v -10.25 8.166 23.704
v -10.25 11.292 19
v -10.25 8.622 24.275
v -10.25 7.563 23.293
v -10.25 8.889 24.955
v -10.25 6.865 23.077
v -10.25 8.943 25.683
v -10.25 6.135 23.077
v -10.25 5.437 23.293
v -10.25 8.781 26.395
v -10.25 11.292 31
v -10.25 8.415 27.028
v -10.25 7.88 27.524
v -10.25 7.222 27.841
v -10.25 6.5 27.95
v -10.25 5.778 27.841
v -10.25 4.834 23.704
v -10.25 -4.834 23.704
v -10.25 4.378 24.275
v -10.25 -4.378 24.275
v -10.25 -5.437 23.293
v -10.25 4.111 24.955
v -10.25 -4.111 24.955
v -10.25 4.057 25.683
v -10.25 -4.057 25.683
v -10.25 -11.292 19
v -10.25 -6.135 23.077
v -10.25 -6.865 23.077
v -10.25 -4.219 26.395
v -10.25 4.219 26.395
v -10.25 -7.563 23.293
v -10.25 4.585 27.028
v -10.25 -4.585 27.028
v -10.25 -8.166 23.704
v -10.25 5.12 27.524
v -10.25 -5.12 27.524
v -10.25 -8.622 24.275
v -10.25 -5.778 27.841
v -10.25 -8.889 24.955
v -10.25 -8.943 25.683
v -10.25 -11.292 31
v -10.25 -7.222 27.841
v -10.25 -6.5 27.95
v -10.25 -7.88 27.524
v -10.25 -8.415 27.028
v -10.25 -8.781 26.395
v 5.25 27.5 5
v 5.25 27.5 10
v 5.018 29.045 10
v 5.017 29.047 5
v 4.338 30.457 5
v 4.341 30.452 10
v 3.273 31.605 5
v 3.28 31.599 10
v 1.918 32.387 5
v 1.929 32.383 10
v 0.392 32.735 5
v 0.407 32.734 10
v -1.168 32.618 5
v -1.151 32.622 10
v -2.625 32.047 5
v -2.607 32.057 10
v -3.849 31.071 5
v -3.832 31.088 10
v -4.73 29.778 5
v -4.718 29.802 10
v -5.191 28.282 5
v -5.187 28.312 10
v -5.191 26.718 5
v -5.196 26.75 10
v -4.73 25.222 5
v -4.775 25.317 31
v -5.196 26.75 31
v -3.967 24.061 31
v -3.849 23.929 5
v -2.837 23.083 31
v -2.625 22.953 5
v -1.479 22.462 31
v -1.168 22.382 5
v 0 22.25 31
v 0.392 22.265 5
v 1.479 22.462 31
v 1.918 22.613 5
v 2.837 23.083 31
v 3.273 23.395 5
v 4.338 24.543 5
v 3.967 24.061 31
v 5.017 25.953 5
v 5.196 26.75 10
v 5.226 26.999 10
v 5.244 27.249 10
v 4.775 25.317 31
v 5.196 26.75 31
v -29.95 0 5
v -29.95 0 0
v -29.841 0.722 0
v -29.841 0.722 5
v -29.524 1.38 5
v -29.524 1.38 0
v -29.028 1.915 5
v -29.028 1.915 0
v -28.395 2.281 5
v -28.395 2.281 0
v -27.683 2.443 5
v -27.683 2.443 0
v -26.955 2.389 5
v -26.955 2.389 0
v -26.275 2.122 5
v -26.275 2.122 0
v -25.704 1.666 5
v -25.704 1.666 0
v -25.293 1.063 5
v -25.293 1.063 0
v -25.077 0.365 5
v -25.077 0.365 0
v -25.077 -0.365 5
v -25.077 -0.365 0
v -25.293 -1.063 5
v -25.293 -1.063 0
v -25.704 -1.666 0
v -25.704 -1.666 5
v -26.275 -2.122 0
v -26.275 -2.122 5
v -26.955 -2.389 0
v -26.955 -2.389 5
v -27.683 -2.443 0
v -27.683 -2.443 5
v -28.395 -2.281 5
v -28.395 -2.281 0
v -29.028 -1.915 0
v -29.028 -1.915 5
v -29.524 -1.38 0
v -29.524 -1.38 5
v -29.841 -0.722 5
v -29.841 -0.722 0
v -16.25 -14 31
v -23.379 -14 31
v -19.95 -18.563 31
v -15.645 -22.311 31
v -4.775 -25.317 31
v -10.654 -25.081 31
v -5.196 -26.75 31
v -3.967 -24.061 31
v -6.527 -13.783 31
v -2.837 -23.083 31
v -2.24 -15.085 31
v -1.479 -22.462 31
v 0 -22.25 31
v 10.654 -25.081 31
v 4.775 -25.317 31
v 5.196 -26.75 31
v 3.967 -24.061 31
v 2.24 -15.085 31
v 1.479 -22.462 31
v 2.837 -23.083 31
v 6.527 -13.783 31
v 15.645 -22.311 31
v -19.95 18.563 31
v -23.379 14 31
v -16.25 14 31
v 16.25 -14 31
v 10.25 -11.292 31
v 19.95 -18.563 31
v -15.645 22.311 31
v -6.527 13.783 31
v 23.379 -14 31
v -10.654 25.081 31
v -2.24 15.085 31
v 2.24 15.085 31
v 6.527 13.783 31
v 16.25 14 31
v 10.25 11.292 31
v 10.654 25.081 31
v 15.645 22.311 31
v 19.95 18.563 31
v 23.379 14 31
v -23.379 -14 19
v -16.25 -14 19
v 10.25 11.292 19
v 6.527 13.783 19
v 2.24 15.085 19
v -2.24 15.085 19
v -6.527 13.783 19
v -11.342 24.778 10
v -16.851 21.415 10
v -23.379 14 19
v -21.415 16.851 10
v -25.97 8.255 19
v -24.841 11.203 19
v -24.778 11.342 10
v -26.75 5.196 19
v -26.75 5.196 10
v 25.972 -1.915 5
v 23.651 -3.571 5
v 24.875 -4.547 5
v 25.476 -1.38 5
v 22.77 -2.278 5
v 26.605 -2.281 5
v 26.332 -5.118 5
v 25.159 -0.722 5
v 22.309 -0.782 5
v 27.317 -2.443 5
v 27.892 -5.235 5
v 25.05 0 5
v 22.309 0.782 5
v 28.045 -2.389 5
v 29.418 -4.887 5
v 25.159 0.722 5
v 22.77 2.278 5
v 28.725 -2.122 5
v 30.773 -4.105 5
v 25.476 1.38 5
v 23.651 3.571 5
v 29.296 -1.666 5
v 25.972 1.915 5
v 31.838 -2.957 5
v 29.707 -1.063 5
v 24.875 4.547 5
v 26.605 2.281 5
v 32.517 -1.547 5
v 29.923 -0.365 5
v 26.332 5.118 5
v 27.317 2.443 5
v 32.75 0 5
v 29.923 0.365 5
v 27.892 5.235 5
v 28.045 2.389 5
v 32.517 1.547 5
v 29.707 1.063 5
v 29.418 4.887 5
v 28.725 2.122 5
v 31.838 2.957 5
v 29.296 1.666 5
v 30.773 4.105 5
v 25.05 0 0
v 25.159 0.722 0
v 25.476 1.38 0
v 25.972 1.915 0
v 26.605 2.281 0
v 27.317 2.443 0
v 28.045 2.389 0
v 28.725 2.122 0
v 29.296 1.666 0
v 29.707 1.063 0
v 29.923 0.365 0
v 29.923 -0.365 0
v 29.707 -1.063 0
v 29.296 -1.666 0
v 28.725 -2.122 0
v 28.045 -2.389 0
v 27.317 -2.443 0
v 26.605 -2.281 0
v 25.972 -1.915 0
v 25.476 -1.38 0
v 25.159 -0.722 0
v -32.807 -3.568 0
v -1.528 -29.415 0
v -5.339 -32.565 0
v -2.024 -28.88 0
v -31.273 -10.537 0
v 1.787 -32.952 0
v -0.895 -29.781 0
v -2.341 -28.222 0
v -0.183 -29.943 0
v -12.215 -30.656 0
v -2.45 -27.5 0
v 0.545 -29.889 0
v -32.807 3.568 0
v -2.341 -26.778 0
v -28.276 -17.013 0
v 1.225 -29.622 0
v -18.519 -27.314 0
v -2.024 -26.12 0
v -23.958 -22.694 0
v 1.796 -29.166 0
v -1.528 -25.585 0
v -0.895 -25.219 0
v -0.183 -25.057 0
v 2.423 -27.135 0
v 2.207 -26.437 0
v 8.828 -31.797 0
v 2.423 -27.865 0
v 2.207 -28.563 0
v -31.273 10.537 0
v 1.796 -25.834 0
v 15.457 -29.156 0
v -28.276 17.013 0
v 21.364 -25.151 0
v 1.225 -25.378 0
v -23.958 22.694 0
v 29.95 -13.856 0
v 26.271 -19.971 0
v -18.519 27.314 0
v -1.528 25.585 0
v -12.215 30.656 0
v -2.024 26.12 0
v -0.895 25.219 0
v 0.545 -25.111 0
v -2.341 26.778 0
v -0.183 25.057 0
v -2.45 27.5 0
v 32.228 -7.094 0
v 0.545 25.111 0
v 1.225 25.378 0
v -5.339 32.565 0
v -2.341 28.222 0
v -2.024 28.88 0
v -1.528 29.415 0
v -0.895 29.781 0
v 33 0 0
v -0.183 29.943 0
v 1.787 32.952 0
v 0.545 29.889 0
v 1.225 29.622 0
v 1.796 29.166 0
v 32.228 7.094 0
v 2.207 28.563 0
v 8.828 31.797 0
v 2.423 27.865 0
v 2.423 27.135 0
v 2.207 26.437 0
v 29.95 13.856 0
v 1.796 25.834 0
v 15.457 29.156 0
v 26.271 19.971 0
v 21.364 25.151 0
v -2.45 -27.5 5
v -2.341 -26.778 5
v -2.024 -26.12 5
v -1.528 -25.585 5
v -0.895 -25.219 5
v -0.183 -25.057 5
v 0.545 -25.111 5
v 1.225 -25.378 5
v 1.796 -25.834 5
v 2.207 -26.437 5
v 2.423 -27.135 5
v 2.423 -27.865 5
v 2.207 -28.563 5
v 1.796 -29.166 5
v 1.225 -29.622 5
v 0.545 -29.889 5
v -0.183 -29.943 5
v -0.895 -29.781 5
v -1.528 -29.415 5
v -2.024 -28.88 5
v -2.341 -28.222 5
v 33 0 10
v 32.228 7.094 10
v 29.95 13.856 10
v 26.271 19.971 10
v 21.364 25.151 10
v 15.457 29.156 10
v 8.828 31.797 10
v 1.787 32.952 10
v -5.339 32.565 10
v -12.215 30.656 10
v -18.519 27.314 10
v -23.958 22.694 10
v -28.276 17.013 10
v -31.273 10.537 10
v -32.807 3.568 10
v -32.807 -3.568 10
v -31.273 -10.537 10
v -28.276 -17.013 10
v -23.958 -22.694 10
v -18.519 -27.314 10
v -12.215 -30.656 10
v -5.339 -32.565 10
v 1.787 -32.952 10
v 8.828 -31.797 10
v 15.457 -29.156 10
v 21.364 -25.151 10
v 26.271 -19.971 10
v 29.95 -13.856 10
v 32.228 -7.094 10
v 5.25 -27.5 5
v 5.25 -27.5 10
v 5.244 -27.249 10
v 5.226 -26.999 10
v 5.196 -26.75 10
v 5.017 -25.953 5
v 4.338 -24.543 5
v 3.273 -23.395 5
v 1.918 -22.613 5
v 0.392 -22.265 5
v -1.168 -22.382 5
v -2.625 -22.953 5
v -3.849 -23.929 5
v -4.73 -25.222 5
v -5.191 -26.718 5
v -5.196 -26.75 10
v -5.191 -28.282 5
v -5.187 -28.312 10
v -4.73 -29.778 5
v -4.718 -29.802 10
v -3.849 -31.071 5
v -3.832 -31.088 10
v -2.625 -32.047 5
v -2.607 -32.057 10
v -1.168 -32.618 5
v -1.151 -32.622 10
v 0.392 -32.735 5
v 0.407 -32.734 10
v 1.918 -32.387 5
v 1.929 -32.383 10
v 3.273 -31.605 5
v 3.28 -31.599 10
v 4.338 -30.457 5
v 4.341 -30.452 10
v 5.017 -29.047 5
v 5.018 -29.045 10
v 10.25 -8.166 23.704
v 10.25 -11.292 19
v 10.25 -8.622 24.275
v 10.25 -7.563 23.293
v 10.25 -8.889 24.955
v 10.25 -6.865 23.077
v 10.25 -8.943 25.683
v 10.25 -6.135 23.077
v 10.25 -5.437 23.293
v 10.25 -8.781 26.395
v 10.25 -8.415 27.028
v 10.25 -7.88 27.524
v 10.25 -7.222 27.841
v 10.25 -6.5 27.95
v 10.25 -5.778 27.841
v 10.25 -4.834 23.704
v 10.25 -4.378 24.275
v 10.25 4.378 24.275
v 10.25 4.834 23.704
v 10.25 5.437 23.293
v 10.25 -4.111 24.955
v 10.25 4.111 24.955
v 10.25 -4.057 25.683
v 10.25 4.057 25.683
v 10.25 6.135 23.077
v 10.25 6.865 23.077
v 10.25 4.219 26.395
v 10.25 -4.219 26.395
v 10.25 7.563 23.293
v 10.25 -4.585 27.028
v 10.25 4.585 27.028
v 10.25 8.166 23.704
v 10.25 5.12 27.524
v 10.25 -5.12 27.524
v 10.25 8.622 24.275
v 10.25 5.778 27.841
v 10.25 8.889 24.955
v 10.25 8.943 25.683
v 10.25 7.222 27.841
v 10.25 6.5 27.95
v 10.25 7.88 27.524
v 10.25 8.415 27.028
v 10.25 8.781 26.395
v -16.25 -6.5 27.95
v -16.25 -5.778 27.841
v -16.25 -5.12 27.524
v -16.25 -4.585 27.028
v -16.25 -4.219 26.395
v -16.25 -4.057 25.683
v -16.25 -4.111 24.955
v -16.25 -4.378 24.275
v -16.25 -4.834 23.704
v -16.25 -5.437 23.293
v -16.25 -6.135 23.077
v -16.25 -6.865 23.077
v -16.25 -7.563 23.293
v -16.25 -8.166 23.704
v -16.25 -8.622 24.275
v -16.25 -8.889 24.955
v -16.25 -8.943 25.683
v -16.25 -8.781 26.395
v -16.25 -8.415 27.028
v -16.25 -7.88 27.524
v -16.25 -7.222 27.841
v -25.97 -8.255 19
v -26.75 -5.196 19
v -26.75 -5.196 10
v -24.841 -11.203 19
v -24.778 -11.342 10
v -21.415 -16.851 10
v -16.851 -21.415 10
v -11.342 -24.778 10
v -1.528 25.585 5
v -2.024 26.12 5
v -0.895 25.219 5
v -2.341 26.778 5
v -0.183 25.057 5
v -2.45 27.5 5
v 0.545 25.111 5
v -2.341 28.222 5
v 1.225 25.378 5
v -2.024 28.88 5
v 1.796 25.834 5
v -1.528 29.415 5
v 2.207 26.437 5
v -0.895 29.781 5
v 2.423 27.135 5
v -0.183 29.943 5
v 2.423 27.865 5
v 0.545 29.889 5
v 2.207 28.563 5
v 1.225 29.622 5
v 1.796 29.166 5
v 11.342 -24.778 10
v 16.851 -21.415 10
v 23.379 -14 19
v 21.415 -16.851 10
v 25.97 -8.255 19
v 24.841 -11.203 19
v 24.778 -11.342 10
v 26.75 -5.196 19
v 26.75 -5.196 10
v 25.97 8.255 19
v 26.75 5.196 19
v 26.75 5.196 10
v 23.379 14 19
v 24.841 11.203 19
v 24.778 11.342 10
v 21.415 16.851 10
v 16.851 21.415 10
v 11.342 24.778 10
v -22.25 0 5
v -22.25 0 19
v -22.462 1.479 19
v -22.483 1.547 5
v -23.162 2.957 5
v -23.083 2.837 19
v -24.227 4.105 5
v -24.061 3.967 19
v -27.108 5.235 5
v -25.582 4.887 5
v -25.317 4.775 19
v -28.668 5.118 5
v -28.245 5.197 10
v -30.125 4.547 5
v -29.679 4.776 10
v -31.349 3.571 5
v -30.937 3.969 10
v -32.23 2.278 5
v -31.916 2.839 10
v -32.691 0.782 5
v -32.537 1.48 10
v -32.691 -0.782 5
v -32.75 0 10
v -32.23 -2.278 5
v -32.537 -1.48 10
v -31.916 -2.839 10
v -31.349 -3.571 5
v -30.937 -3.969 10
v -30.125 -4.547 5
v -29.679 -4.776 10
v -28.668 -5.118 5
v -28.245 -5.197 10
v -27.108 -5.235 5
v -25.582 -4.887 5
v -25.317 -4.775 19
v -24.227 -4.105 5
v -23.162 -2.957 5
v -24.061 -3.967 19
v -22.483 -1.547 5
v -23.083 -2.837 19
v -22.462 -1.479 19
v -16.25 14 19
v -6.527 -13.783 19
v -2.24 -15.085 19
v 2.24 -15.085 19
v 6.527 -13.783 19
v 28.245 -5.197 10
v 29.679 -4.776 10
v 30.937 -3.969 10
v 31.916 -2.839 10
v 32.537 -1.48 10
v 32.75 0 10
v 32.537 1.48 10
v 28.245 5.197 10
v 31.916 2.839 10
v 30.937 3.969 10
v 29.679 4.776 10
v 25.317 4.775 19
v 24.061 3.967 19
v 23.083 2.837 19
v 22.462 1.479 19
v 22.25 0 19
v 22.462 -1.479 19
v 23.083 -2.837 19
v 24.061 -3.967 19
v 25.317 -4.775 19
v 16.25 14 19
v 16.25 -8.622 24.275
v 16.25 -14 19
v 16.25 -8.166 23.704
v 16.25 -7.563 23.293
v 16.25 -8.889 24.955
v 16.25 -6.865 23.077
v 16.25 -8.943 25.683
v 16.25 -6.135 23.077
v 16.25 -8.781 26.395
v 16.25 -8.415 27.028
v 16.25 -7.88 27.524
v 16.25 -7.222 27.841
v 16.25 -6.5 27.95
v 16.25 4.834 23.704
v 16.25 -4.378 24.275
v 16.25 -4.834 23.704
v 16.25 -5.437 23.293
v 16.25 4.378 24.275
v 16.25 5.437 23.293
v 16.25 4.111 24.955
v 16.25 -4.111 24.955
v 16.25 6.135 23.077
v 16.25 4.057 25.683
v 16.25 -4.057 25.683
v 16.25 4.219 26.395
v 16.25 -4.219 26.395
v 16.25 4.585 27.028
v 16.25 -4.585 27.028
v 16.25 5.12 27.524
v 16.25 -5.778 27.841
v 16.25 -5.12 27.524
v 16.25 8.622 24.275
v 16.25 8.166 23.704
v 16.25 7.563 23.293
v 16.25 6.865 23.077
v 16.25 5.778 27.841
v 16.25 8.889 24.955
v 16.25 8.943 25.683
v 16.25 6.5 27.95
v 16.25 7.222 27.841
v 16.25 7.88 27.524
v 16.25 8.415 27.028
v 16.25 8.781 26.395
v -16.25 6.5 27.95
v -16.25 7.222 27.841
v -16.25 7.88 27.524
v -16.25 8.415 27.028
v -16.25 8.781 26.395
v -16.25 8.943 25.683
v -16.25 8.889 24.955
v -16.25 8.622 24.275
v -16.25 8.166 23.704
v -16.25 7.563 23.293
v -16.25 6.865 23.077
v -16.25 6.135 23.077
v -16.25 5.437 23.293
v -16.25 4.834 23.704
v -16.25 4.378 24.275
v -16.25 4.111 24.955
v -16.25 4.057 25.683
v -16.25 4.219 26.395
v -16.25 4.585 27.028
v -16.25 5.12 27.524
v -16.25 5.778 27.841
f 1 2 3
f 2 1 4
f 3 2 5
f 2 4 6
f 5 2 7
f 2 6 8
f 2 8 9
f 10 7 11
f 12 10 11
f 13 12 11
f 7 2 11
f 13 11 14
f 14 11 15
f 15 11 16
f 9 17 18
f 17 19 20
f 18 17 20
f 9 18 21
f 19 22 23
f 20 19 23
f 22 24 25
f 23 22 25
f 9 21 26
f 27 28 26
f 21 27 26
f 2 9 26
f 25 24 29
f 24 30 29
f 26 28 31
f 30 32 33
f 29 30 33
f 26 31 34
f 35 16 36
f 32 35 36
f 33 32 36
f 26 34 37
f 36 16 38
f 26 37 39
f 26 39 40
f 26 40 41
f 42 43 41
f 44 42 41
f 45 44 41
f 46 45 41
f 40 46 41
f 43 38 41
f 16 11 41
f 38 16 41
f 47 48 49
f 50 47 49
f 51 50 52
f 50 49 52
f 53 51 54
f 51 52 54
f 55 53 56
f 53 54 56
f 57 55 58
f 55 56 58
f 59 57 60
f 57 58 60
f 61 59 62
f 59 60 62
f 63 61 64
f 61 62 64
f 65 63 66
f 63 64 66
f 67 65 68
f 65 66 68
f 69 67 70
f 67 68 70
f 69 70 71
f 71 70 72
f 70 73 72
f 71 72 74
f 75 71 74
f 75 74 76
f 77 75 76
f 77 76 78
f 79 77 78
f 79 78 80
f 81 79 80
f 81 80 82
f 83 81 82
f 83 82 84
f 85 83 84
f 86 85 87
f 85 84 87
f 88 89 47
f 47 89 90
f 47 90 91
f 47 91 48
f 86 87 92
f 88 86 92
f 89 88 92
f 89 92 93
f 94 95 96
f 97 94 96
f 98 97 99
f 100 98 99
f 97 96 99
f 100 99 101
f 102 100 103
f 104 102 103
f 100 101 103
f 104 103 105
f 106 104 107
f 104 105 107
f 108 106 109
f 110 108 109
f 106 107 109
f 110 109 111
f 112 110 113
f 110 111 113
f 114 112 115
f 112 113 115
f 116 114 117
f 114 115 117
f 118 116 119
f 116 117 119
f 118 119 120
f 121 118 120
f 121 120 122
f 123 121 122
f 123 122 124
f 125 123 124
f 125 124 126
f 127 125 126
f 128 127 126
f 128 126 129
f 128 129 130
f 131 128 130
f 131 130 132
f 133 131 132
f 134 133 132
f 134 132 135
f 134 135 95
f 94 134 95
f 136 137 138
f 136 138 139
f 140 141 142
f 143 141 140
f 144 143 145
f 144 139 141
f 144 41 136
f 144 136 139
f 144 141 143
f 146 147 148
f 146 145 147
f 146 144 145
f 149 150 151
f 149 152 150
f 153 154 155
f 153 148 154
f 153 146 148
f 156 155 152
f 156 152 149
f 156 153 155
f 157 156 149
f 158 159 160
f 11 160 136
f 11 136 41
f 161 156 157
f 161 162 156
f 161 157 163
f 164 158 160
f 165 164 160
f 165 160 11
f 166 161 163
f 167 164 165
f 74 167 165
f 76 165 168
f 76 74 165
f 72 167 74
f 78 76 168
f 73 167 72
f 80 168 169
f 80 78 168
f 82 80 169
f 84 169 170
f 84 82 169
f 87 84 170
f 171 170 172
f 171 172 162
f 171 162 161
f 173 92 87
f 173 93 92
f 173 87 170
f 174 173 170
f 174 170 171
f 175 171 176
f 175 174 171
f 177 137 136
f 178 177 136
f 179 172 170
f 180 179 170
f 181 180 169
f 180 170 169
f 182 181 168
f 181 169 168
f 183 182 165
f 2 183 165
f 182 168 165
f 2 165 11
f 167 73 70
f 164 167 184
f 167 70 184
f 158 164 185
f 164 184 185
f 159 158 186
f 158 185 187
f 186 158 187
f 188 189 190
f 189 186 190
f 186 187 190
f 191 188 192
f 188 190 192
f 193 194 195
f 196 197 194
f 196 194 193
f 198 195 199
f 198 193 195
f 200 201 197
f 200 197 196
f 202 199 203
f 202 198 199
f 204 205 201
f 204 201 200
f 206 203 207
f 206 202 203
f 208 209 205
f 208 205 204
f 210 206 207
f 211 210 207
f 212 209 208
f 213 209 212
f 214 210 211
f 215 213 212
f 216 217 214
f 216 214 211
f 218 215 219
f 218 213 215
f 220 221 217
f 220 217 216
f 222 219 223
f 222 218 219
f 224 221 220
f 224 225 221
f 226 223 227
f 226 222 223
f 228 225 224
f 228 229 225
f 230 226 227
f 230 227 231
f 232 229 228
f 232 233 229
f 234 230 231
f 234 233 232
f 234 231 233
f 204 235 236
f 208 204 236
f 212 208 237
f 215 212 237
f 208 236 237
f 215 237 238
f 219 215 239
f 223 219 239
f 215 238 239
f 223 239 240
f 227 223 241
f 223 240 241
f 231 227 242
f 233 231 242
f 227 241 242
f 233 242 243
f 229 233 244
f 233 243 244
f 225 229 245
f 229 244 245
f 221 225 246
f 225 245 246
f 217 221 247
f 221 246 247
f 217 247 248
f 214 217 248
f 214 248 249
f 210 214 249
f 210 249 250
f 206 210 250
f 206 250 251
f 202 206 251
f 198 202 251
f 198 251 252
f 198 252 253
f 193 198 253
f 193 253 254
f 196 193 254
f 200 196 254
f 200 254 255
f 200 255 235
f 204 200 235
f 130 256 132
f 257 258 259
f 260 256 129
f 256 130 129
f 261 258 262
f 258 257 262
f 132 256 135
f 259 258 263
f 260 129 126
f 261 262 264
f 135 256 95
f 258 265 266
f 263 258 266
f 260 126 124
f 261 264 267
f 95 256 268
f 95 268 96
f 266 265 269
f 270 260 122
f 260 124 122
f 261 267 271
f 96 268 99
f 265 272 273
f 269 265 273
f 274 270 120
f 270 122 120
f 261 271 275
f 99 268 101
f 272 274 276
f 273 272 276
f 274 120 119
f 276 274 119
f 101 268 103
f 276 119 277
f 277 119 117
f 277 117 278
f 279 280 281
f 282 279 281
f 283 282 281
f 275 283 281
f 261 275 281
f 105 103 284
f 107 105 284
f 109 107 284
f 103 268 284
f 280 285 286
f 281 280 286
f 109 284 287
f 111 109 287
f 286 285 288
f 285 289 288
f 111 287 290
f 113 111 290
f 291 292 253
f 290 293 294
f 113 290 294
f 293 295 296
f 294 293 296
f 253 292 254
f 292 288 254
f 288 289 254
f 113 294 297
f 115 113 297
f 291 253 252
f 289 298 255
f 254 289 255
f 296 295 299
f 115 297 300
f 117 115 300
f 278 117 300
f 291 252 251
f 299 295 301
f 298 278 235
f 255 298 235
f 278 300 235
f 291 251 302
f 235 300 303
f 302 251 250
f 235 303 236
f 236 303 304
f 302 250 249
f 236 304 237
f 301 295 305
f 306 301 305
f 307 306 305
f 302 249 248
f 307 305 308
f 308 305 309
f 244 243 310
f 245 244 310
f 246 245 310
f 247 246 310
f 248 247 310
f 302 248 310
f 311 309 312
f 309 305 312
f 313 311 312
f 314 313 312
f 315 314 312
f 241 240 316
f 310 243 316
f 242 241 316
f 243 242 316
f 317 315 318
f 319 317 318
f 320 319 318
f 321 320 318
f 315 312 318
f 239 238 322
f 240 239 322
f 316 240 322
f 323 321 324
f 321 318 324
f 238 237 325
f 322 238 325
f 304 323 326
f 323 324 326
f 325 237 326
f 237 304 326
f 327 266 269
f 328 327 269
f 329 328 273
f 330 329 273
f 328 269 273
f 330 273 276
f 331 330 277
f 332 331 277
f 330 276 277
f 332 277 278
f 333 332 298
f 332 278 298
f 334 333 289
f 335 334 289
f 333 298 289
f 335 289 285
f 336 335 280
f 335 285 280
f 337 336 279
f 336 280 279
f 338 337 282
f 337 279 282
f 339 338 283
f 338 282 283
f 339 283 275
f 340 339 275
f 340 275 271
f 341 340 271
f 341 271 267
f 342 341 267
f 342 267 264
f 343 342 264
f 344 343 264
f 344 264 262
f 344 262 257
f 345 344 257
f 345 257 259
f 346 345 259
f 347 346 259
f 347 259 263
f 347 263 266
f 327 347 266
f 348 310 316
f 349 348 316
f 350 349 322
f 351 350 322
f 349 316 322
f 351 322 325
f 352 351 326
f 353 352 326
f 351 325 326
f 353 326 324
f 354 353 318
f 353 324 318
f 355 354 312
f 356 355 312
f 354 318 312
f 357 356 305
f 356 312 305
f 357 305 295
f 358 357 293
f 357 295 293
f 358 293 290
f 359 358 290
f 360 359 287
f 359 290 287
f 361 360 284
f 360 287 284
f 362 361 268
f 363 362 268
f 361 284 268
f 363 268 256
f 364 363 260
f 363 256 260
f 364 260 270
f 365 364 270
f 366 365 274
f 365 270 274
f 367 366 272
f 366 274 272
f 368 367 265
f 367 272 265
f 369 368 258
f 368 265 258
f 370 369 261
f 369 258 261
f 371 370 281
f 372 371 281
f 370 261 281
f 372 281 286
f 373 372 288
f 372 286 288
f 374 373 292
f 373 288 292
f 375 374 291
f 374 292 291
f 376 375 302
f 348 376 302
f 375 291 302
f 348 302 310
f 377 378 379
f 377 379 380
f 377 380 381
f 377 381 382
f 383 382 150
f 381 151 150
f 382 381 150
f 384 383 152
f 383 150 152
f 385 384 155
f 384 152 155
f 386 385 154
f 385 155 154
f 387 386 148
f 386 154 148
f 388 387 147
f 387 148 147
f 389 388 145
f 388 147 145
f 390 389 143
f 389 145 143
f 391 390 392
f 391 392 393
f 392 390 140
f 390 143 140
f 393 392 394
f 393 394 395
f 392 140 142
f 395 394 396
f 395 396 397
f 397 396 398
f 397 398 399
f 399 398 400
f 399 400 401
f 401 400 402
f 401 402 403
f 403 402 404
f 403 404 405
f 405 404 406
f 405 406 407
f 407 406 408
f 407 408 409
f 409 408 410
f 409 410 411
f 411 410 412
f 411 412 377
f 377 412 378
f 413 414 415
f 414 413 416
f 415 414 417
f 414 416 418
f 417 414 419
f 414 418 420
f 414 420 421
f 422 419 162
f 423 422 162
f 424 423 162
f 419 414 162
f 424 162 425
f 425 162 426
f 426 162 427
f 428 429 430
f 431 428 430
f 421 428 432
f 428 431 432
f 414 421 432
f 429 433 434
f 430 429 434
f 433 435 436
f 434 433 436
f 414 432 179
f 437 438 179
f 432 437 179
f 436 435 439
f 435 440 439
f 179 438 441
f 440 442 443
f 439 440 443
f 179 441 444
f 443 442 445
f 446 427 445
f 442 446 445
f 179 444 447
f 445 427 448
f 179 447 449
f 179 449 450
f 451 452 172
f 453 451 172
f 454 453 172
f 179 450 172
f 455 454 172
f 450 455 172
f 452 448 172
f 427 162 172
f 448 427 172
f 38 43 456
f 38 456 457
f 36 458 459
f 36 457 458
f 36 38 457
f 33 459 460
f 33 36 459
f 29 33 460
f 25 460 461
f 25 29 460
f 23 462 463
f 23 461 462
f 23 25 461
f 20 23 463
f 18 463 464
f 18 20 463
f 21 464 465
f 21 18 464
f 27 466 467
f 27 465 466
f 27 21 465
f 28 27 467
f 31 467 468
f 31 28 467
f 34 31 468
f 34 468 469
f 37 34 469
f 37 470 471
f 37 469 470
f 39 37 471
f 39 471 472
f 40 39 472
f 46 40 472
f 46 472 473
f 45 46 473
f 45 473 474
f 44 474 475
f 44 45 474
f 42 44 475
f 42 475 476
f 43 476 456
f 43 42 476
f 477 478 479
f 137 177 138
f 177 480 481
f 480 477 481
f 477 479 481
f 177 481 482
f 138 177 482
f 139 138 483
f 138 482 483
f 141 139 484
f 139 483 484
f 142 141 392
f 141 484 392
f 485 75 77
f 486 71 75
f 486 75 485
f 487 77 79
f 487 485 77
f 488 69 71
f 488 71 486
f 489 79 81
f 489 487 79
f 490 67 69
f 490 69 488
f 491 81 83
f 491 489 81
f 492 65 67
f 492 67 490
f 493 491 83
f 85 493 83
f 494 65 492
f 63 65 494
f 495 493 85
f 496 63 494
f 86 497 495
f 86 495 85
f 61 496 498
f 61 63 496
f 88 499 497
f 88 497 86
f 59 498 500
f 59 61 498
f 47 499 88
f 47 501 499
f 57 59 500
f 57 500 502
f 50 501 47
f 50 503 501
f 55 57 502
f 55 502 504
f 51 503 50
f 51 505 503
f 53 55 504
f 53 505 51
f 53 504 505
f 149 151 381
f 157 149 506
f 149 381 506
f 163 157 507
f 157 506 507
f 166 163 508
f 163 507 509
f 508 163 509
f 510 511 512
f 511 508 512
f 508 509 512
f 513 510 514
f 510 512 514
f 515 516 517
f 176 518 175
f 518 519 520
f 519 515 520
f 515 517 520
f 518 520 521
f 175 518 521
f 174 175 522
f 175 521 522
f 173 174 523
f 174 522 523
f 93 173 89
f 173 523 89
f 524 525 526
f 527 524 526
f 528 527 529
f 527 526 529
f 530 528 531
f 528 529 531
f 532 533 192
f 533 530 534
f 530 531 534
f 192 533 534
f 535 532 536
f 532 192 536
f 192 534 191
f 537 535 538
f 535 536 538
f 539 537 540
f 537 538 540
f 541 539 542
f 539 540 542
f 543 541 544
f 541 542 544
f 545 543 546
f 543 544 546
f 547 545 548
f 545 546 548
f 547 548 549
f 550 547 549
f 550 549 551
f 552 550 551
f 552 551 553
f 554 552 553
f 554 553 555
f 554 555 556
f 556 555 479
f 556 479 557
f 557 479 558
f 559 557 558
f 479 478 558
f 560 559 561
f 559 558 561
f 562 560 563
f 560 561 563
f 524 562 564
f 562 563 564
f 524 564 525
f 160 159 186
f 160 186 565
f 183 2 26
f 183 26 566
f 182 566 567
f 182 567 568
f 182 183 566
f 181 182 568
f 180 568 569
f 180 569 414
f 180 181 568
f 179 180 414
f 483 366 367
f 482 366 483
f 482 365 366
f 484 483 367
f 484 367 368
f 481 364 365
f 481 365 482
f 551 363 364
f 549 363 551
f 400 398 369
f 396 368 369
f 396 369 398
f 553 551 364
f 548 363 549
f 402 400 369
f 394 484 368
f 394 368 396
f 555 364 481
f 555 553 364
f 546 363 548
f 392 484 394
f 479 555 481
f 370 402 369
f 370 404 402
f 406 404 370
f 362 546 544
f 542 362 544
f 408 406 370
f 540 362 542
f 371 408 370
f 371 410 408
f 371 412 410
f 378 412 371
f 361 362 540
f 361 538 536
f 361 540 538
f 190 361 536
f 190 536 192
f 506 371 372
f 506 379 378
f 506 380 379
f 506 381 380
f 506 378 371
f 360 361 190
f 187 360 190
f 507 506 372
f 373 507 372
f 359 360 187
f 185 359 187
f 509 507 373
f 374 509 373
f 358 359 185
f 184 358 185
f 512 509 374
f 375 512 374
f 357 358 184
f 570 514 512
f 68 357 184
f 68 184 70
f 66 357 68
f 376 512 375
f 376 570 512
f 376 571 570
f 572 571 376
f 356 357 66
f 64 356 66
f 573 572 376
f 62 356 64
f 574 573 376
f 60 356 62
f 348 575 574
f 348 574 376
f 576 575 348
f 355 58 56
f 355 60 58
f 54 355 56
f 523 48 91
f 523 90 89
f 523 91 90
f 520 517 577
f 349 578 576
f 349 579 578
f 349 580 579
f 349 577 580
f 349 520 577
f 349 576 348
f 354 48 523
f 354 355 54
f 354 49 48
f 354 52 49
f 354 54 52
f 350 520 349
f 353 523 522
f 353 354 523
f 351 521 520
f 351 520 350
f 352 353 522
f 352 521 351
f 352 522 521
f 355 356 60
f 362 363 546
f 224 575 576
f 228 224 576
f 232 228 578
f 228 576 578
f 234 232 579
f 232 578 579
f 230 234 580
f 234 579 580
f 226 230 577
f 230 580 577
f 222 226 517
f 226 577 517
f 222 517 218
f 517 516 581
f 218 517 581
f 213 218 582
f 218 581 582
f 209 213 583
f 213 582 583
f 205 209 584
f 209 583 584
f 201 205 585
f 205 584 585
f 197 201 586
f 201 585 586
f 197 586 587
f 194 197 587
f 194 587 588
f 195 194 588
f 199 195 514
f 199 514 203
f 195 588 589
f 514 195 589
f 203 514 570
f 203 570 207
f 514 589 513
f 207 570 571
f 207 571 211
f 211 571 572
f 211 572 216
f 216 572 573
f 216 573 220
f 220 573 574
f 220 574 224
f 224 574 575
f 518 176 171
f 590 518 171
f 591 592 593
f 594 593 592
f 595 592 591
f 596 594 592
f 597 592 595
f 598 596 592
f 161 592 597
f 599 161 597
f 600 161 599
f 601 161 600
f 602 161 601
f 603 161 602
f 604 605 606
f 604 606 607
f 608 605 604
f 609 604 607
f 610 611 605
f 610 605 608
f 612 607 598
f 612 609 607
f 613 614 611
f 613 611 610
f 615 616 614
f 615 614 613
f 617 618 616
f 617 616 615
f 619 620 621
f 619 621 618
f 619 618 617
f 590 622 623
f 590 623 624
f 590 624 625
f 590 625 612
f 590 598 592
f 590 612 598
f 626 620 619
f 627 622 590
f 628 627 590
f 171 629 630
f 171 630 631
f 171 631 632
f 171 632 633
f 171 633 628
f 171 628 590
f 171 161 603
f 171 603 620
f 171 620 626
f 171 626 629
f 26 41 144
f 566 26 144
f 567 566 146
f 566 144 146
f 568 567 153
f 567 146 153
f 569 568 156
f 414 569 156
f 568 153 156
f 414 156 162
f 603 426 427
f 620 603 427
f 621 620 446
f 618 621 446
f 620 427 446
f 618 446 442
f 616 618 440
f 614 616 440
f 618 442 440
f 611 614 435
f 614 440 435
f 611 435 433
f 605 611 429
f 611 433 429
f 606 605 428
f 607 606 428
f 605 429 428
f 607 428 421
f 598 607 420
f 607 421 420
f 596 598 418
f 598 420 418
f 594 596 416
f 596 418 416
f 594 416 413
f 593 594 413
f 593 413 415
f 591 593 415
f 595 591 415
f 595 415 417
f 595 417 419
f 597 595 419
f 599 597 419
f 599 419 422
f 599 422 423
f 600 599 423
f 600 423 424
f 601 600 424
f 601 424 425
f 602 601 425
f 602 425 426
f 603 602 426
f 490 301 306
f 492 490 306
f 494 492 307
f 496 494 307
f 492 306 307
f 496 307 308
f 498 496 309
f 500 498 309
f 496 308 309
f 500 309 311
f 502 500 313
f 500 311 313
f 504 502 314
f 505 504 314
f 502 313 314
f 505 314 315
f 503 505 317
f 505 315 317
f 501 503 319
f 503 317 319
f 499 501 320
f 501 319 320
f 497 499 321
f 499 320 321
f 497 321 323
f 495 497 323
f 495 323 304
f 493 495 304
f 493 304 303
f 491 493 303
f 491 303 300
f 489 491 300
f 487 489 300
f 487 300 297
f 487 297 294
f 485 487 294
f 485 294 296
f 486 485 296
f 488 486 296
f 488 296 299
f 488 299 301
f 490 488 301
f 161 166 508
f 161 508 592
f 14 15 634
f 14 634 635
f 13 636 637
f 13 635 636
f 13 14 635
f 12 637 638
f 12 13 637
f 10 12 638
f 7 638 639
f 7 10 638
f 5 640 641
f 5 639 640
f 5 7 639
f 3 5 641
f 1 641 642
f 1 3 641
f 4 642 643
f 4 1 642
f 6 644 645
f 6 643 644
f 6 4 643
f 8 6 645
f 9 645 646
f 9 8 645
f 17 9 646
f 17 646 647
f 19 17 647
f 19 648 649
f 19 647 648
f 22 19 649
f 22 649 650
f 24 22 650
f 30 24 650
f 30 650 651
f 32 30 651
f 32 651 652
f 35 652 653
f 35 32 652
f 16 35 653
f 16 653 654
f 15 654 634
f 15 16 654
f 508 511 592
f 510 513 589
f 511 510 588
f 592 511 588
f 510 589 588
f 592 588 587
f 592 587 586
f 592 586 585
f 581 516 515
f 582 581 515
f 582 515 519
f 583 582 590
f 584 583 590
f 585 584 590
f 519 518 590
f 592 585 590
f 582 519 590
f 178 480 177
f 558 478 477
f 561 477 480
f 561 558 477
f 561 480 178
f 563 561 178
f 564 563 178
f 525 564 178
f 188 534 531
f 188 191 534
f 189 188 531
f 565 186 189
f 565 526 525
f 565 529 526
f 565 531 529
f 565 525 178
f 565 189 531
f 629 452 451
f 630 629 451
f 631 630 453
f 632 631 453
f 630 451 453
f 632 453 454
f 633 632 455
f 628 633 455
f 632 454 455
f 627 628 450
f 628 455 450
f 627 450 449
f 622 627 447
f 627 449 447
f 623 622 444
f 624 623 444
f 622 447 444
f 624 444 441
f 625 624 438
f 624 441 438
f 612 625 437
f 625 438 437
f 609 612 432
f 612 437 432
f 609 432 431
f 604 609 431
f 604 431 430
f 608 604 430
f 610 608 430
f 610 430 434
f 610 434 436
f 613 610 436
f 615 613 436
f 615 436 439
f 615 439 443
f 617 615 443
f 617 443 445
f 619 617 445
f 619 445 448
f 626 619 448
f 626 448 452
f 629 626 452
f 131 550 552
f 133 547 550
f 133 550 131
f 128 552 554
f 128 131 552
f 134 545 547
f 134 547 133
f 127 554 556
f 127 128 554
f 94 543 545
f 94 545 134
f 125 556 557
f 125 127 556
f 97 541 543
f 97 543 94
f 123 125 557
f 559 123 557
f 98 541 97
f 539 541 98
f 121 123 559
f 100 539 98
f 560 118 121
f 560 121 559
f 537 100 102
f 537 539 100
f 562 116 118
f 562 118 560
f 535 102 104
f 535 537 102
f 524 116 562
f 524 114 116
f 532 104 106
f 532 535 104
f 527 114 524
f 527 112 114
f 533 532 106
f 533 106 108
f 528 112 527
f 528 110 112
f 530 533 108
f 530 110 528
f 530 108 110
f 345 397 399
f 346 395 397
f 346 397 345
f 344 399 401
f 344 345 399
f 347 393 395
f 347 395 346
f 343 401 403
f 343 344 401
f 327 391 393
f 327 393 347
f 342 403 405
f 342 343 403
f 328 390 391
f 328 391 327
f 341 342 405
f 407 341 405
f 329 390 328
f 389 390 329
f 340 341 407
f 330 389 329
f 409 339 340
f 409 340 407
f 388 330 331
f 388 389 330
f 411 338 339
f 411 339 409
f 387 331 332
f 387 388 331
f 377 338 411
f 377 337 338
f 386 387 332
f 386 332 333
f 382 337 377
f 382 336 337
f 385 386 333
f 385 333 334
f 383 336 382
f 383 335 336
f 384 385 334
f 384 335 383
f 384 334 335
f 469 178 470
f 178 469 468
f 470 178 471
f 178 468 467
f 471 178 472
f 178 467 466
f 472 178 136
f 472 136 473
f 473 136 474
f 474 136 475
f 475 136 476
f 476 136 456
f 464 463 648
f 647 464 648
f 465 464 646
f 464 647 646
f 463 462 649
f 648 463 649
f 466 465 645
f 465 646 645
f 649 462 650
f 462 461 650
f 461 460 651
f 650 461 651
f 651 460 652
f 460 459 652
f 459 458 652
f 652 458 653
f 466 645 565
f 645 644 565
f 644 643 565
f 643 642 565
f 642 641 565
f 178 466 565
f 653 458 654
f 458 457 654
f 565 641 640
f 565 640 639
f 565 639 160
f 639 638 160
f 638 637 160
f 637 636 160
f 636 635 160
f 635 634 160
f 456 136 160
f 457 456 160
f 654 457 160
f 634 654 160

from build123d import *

# Parameters (mm, degrees)
SKETCH1_R           = 33
EXTRUDE1_DEPTH      = 10
SKETCH2_R           = 27.25
EXTRUDE2_DEPTH      = 21
EXTRUDE3_DEPTH      = 12
SKETCH4_R           = 2.45
EXTRUDE4_DEPTH      = 36
SKETCH5_R           = 2.45
EXTRUDE5_DEPTH      = 38
EXTRUDE5_DEPTH_BACK = 38
SKETCH6_W           = 19.894607887
SKETCH6_H           = 28
EXTRUDE6_DEPTH      = 12
SKETCH8_R           = 5.25
EXTRUDE7_DEPTH      = 26


with BuildPart() as part:
    # Sketch1 → Extrude1 (new body)
    with BuildSketch(Plane.XY):
        Circle(SKETCH1_R)
    extrude(amount=EXTRUDE1_DEPTH)

    # Sketch2 → Extrude2 (add)
    with BuildSketch(Plane.XY.offset(10)):
        Circle(SKETCH2_R)
    extrude(amount=EXTRUDE2_DEPTH)

    # Sketch3 → Extrude3 (cut)
    with BuildSketch(Plane.XY.offset(31)):
        with BuildLine():
            Line((-10.25, 11.291589791), (-10.25, -11.291589791))
            ThreePointArc((-10.25, -11.291589791), (0, -15.25), (10.25, -11.291589791))
            Line((10.25, -11.291589791), (10.25, 11.291589791))
            ThreePointArc((10.25, 11.291589791), (0, 15.25), (-10.25, 11.291589791))
        make_face()
    extrude(amount=-EXTRUDE3_DEPTH, mode=Mode.SUBTRACT)

    # Sketch4 → Extrude4 (cut)
    with BuildSketch(Plane(origin=(0, 0, 0), x_dir=(-1, 0, 0), z_dir=(0, 0, -1))):
        with Locations((0, 27.5)):
            Circle(SKETCH4_R)
        with Locations((-27.5, 0)):
            Circle(SKETCH4_R)
        with Locations((0, -27.5)):
            Circle(SKETCH4_R)
        with Locations((27.5, 0)):
            Circle(SKETCH4_R)
    extrude(amount=-EXTRUDE4_DEPTH, mode=Mode.SUBTRACT)

    # Sketch5 → Extrude5 (cut, two sides)
    with BuildSketch(Plane.ZY.offset(-10.25)) as extrude5_sk:
        with Locations((25.5, 6.5)):
            Circle(SKETCH5_R)
        with Locations((25.5, -6.5)):
            Circle(SKETCH5_R)
    extrude(amount=EXTRUDE5_DEPTH, mode=Mode.SUBTRACT)
    extrude(extrude5_sk.sketch, amount=-EXTRUDE5_DEPTH_BACK, mode=Mode.SUBTRACT)

    # Sketch6 → Extrude6 (cut)
    with BuildSketch(Plane.XY.offset(31)):
        with Locations((-26.197303943, 0)):
            Rectangle(SKETCH6_W, SKETCH6_H)
    extrude6 = extrude(amount=-EXTRUDE6_DEPTH, mode=Mode.SUBTRACT)

    # Mirror1: Extrude6 across plane
    add(extrude6.mirror(Plane(origin=(0, 0, 0), x_dir=(0, 0, 1), z_dir=(1, 0, 0))), mode=Mode.SUBTRACT)

    # Sketch8 → Extrude7 (cut)
    with BuildSketch(Plane.XY.offset(31)):
        with Locations((0, 27.5)):
            Circle(SKETCH8_R)
        with Locations((27.5, 0)):
            Circle(SKETCH8_R)
        with Locations((-27.5, 0)):
            Circle(SKETCH8_R)
        with Locations((0, -27.5)):
            Circle(SKETCH8_R)
    extrude(amount=-EXTRUDE7_DEPTH, mode=Mode.SUBTRACT)


solid = part.part
